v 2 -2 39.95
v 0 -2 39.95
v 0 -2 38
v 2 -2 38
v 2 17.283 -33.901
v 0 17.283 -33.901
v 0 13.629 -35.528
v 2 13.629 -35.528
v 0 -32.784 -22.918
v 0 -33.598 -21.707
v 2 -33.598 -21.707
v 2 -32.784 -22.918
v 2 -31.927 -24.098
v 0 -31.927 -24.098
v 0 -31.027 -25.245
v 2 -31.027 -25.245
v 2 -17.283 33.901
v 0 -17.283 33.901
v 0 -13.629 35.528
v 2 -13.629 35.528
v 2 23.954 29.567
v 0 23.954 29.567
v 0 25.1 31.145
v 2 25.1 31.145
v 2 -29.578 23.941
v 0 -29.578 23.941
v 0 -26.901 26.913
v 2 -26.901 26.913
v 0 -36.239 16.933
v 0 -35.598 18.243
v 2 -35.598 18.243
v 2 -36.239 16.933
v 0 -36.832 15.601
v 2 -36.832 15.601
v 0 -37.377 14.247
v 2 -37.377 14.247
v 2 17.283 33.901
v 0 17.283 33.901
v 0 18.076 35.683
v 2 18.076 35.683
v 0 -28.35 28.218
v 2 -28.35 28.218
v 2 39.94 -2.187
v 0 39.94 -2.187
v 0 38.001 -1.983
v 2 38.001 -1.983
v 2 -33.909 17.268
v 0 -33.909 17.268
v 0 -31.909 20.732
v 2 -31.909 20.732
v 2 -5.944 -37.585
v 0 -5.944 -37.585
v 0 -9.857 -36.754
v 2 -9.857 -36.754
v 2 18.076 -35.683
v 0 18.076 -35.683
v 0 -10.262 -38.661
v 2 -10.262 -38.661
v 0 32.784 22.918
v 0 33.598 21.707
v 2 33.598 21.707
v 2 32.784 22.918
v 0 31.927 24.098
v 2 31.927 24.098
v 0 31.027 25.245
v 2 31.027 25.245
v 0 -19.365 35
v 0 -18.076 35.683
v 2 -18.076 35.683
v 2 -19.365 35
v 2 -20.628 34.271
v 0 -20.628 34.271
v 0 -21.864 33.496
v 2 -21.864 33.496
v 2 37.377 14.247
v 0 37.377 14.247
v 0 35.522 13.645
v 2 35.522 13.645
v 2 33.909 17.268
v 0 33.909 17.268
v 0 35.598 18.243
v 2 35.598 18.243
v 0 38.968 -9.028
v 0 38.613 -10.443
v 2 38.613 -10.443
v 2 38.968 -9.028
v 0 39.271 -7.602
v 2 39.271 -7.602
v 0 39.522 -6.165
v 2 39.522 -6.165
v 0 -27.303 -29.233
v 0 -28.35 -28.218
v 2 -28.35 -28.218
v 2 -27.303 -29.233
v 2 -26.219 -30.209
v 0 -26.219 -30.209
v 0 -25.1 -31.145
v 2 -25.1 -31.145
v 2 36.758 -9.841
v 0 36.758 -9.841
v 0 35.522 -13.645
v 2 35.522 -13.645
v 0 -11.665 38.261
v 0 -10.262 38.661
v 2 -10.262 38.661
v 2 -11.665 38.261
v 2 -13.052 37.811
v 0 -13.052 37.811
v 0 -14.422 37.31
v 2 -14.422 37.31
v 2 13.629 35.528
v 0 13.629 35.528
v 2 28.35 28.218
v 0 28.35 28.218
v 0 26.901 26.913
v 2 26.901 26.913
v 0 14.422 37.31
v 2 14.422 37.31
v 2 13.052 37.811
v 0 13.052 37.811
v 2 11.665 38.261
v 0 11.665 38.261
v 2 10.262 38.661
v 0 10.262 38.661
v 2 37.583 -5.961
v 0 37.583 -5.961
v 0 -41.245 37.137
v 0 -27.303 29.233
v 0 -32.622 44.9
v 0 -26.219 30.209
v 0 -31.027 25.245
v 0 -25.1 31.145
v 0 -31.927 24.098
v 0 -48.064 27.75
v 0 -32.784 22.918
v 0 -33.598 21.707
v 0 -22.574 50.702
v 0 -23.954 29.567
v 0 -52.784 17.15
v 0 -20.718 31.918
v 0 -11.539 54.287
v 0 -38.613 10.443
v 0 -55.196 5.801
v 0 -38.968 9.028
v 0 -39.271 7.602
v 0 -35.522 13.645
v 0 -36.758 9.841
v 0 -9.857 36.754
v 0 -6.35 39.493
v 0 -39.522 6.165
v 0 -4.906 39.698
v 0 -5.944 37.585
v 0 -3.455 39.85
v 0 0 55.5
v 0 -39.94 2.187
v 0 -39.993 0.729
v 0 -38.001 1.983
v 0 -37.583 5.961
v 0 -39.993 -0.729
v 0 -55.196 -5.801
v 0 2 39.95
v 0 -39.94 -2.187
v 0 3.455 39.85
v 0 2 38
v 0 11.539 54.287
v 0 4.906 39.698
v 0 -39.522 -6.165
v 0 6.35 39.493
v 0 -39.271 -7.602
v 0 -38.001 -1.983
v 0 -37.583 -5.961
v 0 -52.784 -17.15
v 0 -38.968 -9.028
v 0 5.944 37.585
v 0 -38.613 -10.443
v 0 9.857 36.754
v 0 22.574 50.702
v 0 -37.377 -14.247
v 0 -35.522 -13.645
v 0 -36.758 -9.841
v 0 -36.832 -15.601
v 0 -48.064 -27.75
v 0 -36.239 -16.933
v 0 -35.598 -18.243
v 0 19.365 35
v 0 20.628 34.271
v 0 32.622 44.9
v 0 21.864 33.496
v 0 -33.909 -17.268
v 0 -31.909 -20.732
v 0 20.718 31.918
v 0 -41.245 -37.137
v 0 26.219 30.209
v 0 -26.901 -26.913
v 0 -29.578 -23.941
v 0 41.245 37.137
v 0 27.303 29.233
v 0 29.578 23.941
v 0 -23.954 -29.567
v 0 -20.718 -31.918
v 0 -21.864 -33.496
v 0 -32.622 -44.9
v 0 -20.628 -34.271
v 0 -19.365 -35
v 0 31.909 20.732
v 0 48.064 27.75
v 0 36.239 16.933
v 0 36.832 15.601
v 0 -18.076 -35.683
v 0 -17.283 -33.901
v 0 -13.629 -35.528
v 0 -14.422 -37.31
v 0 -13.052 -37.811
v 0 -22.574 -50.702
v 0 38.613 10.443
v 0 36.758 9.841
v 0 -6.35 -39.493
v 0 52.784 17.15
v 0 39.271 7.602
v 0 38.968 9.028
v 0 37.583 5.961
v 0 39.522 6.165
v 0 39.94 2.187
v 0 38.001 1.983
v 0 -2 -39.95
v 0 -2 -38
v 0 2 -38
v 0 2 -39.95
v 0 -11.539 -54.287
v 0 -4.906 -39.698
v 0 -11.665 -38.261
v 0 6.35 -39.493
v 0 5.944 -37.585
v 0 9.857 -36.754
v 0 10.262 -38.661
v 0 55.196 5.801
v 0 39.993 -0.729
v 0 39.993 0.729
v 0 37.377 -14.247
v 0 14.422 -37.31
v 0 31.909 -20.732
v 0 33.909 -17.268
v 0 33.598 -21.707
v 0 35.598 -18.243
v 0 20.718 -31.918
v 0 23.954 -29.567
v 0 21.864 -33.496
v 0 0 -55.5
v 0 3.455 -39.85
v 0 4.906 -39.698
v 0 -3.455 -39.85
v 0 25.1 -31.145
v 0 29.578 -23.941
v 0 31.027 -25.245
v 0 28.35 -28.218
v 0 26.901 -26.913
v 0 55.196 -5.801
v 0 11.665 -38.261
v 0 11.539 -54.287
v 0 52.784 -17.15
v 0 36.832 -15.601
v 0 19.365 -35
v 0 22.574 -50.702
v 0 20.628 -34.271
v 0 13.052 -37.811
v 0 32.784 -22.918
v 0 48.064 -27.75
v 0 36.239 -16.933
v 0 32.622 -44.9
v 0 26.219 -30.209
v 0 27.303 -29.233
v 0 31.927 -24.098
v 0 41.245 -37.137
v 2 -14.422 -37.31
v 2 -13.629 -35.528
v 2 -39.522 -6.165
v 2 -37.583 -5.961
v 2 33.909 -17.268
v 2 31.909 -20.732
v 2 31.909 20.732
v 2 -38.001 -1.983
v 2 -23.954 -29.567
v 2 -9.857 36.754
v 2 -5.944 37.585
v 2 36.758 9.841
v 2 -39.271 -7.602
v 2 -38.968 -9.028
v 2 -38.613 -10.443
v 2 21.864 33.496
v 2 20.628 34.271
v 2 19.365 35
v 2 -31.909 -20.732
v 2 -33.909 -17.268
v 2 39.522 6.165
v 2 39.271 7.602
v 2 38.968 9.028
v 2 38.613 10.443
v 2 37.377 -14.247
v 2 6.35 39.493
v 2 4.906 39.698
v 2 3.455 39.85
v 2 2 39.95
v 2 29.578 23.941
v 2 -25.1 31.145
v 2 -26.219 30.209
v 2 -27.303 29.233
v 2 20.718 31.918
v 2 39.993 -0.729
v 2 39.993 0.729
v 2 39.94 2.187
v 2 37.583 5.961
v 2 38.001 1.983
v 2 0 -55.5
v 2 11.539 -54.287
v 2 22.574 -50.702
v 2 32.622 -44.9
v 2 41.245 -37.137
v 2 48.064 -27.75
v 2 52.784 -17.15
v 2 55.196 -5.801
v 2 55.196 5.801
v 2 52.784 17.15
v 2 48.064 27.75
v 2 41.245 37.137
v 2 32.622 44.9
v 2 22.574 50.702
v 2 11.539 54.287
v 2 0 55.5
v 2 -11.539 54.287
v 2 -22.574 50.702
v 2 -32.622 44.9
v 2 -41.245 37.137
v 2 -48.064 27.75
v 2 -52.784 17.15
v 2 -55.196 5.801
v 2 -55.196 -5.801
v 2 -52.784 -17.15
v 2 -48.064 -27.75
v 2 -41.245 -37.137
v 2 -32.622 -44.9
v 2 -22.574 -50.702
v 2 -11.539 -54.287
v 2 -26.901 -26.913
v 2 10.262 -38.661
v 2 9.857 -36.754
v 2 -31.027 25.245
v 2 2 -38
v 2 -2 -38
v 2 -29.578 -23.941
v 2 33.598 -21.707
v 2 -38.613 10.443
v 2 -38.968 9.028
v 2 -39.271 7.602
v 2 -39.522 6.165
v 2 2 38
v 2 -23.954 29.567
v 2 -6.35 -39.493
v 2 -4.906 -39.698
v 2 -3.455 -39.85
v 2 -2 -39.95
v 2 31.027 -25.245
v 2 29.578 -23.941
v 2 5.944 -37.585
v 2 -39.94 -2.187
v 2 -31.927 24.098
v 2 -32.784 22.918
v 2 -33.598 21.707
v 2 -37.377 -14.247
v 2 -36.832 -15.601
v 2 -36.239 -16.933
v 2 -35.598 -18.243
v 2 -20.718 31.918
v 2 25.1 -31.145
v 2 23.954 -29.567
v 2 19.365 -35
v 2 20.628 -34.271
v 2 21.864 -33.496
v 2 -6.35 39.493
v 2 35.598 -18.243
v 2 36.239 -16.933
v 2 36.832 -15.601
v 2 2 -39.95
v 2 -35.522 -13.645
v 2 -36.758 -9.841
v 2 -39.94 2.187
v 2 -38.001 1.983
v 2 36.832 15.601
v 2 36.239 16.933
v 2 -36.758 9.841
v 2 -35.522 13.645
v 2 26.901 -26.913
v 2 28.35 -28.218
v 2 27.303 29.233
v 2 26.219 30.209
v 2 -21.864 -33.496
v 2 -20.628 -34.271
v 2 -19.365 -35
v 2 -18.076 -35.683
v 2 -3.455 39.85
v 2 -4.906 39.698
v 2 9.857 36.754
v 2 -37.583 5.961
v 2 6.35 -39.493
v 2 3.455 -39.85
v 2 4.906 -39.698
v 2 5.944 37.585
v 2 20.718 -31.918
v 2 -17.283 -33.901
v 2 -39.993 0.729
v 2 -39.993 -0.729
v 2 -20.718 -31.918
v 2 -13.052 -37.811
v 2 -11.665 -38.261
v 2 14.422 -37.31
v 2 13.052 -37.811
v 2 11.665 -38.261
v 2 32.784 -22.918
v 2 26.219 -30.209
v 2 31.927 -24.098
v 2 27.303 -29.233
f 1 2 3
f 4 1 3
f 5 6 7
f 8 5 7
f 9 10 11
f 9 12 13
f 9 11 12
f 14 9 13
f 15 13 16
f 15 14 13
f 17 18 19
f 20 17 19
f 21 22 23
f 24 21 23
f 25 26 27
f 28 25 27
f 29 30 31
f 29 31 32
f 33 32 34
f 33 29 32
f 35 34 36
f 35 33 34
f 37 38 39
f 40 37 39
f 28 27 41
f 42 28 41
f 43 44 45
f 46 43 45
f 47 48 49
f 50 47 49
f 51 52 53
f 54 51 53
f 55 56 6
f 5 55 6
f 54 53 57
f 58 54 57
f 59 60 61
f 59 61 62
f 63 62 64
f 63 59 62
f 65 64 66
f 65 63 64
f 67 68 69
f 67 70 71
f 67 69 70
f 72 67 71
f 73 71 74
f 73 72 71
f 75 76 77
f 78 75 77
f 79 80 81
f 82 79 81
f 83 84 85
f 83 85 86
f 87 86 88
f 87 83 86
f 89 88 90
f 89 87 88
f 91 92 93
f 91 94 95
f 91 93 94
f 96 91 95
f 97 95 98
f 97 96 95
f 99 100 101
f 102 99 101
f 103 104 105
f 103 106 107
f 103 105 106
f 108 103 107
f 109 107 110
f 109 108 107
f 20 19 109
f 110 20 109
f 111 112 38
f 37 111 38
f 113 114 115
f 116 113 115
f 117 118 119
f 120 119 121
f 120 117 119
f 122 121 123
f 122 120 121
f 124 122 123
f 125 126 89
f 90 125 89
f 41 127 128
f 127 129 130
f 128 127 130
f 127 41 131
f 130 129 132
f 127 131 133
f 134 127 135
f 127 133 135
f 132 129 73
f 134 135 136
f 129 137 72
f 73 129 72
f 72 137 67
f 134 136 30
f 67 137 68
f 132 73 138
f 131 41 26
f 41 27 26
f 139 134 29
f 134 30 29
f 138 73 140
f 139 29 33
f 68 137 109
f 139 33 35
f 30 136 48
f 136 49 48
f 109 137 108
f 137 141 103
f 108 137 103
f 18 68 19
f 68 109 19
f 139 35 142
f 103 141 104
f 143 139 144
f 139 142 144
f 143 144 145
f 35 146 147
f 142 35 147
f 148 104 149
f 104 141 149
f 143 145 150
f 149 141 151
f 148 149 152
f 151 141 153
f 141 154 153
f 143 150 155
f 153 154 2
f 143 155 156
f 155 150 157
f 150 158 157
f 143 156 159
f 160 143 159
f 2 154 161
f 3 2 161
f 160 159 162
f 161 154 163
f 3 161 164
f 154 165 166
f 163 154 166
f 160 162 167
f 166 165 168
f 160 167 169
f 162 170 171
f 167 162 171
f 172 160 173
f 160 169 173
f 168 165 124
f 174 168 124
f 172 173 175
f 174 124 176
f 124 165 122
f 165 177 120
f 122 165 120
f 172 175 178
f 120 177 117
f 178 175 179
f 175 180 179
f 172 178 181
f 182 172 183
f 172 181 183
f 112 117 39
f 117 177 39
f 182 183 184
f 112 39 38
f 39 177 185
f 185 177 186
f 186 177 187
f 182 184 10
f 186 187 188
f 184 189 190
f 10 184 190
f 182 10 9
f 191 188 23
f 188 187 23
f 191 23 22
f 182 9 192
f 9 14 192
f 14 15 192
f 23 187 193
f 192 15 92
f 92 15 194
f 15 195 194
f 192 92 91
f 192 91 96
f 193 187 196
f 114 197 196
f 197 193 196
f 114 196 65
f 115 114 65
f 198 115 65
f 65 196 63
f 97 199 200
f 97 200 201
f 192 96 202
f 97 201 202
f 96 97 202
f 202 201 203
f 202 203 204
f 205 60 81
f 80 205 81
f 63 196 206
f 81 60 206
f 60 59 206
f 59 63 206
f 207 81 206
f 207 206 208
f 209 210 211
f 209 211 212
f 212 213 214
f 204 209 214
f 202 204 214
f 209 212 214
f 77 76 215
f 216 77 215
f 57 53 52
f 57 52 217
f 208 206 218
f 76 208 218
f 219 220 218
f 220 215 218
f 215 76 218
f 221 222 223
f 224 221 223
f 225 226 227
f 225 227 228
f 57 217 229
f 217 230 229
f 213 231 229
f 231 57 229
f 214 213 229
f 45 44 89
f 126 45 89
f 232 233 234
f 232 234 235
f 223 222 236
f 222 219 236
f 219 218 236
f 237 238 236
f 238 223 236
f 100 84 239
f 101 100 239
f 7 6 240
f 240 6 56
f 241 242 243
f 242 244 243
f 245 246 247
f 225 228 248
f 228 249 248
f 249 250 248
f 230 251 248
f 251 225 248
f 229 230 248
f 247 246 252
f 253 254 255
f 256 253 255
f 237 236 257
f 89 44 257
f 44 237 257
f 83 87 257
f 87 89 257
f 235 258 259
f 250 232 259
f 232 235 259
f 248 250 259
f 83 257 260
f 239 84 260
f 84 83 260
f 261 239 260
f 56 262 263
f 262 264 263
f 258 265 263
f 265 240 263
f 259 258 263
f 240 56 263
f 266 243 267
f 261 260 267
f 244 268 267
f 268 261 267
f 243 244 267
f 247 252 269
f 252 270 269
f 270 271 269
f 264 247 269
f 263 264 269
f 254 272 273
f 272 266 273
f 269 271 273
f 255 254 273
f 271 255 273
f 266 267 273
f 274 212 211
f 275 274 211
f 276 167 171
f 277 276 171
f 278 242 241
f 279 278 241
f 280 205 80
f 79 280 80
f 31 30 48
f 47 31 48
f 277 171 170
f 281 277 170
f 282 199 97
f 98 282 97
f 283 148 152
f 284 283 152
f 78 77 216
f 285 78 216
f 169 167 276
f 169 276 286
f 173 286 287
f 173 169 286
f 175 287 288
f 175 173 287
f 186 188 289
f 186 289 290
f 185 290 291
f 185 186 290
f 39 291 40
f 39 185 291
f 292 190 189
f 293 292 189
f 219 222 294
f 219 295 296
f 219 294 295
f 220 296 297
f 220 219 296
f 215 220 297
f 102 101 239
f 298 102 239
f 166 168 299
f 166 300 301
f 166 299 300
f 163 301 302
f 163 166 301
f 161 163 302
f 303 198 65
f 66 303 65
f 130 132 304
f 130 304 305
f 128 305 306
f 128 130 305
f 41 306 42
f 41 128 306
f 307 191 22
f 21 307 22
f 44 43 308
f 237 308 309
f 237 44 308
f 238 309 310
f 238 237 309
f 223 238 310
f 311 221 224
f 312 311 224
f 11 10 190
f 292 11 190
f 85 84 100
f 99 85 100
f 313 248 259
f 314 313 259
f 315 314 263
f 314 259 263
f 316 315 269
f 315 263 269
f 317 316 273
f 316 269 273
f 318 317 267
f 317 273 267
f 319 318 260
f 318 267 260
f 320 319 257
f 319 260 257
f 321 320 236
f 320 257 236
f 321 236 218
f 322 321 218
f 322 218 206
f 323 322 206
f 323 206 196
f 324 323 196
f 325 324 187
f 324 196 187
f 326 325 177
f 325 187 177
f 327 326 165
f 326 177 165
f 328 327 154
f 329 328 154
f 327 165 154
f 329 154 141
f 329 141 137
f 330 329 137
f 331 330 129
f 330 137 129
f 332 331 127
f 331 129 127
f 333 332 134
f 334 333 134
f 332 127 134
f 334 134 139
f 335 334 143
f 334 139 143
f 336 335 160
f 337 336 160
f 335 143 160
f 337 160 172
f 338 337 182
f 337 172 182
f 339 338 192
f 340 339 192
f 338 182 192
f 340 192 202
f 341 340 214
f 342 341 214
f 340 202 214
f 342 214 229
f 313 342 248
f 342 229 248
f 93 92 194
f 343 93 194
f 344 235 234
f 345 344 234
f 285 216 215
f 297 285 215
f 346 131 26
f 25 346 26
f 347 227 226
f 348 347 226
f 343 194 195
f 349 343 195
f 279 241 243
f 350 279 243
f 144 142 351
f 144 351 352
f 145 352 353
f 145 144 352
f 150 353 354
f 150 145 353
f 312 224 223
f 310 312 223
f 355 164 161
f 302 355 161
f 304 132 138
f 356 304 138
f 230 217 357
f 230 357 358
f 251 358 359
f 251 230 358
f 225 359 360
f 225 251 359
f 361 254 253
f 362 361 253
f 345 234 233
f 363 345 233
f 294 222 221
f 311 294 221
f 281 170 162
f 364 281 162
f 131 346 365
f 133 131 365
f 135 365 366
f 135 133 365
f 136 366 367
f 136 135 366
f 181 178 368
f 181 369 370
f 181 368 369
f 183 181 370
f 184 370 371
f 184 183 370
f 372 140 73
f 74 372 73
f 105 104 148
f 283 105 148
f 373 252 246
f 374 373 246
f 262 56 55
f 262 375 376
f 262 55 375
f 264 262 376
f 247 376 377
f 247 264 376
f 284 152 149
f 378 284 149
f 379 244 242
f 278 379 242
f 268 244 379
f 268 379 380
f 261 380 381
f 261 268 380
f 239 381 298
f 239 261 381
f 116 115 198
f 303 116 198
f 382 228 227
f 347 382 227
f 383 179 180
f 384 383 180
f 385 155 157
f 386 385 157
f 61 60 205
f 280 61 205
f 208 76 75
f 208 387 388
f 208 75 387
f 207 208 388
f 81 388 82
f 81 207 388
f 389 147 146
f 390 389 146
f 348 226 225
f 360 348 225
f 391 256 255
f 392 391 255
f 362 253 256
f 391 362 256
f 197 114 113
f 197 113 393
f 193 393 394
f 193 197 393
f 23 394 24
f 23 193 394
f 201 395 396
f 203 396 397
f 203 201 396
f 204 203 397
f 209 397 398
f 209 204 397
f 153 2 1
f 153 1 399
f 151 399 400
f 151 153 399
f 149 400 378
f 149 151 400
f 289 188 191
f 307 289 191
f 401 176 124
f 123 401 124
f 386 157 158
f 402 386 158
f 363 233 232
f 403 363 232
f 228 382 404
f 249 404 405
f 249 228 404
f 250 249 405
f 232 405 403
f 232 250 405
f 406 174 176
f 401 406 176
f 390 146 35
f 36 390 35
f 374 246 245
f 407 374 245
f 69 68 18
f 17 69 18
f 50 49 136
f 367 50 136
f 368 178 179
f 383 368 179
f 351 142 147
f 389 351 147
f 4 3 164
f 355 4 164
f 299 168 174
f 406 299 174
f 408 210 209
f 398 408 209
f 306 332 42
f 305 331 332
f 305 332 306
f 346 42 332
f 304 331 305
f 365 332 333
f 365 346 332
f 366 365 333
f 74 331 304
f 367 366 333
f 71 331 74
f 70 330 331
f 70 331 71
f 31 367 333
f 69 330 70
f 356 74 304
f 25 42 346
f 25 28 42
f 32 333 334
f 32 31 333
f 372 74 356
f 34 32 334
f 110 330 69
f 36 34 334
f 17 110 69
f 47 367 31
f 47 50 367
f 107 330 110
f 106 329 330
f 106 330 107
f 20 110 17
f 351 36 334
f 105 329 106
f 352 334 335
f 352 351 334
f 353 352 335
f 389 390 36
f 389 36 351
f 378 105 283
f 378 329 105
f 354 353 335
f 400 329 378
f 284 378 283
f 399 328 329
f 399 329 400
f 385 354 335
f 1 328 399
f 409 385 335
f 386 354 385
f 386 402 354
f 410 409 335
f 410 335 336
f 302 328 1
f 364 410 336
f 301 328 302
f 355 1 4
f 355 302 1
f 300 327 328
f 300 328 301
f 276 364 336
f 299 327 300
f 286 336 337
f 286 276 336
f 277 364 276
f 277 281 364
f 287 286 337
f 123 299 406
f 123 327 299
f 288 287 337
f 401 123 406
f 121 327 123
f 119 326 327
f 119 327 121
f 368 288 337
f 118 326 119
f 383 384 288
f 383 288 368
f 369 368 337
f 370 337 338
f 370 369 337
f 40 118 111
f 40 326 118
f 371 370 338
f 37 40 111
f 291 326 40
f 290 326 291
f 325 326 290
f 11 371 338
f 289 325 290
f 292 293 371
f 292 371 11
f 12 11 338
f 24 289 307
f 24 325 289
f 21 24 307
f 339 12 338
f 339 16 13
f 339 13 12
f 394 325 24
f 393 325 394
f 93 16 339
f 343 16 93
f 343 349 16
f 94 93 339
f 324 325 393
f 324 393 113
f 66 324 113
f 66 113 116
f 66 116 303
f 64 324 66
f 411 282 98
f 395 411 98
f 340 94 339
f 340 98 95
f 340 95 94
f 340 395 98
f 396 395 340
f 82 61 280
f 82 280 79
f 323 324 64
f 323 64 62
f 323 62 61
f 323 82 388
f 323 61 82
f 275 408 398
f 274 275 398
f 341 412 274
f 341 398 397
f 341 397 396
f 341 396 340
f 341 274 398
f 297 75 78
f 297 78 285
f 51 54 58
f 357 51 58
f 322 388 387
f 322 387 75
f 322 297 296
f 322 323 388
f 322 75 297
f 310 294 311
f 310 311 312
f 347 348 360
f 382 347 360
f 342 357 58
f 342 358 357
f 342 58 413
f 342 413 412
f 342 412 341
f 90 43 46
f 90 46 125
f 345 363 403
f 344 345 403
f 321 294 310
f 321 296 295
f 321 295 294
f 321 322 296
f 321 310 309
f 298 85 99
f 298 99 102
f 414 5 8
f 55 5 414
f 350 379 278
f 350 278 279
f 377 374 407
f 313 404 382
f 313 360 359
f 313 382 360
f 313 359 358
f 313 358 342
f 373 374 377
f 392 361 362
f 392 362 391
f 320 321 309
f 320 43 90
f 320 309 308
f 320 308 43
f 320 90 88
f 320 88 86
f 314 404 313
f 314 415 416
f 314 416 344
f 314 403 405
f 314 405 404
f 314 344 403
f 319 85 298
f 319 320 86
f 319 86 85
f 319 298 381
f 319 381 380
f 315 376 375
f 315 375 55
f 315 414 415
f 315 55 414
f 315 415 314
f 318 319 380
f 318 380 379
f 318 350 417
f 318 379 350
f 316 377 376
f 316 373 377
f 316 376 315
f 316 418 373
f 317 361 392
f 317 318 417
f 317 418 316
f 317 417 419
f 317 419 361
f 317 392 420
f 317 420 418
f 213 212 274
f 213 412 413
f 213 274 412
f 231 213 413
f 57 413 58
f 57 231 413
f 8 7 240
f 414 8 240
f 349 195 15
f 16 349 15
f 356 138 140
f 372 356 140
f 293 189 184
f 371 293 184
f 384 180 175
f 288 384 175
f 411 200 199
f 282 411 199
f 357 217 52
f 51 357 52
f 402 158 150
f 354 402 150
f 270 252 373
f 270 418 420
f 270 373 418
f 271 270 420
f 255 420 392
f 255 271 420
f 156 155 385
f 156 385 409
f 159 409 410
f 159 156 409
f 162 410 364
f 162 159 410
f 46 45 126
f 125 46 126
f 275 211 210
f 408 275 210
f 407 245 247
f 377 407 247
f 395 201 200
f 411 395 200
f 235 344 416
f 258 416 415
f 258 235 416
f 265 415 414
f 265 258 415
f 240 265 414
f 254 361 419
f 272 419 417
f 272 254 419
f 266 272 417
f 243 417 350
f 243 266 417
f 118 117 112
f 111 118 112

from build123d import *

# Parameters (mm, degrees)
SKETCH1_R           = 55.5
BOSS_EXTRUDE1_DEPTH = 2
BOSS_EXTRUDE2_DEPTH = 2
CIRPATTERN1_COUNT   = 30


with BuildPart() as part:
    # Sketch1 → Boss-Extrude1 (new body)
    with BuildSketch(Plane.YZ):
        Circle(SKETCH1_R)
        with BuildLine():
            ThreePointArc((40, 0), (-27.568097504, -28.982753492), (-2, 39.949968711))
            ThreePointArc((-2, 39.949968711), (0, 40), (2, 39.949968711))
            ThreePointArc((2, 39.949968711), (28.982753492, 27.568097504), (40, 0))
        make_face(mode=Mode.SUBTRACT)
    extrude(amount=BOSS_EXTRUDE1_DEPTH)

    # Sketch1<3> → Boss-Extrude2 (add)
    with BuildSketch(Plane.YZ):
        with BuildLine():
            Line((-2, 39.949968711), (-2, 38))
            Line((-2, 38), (2, 38))
            Line((2, 38), (2, 39.949968711))
            ThreePointArc((2, 39.949968711), (0, 40), (-2, 39.949968711))
        make_face()
    boss_extrude2 = extrude(amount=BOSS_EXTRUDE2_DEPTH)

    # CirPattern1: Boss-Extrude2 ×30 about axis
    cirpattern1_axis = Axis((2, 0, 0), (1, 0, 0))
    for i in range(1, CIRPATTERN1_COUNT):
        add(boss_extrude2.rotate(cirpattern1_axis, i * 360 / CIRPATTERN1_COUNT))


solid = part.part
